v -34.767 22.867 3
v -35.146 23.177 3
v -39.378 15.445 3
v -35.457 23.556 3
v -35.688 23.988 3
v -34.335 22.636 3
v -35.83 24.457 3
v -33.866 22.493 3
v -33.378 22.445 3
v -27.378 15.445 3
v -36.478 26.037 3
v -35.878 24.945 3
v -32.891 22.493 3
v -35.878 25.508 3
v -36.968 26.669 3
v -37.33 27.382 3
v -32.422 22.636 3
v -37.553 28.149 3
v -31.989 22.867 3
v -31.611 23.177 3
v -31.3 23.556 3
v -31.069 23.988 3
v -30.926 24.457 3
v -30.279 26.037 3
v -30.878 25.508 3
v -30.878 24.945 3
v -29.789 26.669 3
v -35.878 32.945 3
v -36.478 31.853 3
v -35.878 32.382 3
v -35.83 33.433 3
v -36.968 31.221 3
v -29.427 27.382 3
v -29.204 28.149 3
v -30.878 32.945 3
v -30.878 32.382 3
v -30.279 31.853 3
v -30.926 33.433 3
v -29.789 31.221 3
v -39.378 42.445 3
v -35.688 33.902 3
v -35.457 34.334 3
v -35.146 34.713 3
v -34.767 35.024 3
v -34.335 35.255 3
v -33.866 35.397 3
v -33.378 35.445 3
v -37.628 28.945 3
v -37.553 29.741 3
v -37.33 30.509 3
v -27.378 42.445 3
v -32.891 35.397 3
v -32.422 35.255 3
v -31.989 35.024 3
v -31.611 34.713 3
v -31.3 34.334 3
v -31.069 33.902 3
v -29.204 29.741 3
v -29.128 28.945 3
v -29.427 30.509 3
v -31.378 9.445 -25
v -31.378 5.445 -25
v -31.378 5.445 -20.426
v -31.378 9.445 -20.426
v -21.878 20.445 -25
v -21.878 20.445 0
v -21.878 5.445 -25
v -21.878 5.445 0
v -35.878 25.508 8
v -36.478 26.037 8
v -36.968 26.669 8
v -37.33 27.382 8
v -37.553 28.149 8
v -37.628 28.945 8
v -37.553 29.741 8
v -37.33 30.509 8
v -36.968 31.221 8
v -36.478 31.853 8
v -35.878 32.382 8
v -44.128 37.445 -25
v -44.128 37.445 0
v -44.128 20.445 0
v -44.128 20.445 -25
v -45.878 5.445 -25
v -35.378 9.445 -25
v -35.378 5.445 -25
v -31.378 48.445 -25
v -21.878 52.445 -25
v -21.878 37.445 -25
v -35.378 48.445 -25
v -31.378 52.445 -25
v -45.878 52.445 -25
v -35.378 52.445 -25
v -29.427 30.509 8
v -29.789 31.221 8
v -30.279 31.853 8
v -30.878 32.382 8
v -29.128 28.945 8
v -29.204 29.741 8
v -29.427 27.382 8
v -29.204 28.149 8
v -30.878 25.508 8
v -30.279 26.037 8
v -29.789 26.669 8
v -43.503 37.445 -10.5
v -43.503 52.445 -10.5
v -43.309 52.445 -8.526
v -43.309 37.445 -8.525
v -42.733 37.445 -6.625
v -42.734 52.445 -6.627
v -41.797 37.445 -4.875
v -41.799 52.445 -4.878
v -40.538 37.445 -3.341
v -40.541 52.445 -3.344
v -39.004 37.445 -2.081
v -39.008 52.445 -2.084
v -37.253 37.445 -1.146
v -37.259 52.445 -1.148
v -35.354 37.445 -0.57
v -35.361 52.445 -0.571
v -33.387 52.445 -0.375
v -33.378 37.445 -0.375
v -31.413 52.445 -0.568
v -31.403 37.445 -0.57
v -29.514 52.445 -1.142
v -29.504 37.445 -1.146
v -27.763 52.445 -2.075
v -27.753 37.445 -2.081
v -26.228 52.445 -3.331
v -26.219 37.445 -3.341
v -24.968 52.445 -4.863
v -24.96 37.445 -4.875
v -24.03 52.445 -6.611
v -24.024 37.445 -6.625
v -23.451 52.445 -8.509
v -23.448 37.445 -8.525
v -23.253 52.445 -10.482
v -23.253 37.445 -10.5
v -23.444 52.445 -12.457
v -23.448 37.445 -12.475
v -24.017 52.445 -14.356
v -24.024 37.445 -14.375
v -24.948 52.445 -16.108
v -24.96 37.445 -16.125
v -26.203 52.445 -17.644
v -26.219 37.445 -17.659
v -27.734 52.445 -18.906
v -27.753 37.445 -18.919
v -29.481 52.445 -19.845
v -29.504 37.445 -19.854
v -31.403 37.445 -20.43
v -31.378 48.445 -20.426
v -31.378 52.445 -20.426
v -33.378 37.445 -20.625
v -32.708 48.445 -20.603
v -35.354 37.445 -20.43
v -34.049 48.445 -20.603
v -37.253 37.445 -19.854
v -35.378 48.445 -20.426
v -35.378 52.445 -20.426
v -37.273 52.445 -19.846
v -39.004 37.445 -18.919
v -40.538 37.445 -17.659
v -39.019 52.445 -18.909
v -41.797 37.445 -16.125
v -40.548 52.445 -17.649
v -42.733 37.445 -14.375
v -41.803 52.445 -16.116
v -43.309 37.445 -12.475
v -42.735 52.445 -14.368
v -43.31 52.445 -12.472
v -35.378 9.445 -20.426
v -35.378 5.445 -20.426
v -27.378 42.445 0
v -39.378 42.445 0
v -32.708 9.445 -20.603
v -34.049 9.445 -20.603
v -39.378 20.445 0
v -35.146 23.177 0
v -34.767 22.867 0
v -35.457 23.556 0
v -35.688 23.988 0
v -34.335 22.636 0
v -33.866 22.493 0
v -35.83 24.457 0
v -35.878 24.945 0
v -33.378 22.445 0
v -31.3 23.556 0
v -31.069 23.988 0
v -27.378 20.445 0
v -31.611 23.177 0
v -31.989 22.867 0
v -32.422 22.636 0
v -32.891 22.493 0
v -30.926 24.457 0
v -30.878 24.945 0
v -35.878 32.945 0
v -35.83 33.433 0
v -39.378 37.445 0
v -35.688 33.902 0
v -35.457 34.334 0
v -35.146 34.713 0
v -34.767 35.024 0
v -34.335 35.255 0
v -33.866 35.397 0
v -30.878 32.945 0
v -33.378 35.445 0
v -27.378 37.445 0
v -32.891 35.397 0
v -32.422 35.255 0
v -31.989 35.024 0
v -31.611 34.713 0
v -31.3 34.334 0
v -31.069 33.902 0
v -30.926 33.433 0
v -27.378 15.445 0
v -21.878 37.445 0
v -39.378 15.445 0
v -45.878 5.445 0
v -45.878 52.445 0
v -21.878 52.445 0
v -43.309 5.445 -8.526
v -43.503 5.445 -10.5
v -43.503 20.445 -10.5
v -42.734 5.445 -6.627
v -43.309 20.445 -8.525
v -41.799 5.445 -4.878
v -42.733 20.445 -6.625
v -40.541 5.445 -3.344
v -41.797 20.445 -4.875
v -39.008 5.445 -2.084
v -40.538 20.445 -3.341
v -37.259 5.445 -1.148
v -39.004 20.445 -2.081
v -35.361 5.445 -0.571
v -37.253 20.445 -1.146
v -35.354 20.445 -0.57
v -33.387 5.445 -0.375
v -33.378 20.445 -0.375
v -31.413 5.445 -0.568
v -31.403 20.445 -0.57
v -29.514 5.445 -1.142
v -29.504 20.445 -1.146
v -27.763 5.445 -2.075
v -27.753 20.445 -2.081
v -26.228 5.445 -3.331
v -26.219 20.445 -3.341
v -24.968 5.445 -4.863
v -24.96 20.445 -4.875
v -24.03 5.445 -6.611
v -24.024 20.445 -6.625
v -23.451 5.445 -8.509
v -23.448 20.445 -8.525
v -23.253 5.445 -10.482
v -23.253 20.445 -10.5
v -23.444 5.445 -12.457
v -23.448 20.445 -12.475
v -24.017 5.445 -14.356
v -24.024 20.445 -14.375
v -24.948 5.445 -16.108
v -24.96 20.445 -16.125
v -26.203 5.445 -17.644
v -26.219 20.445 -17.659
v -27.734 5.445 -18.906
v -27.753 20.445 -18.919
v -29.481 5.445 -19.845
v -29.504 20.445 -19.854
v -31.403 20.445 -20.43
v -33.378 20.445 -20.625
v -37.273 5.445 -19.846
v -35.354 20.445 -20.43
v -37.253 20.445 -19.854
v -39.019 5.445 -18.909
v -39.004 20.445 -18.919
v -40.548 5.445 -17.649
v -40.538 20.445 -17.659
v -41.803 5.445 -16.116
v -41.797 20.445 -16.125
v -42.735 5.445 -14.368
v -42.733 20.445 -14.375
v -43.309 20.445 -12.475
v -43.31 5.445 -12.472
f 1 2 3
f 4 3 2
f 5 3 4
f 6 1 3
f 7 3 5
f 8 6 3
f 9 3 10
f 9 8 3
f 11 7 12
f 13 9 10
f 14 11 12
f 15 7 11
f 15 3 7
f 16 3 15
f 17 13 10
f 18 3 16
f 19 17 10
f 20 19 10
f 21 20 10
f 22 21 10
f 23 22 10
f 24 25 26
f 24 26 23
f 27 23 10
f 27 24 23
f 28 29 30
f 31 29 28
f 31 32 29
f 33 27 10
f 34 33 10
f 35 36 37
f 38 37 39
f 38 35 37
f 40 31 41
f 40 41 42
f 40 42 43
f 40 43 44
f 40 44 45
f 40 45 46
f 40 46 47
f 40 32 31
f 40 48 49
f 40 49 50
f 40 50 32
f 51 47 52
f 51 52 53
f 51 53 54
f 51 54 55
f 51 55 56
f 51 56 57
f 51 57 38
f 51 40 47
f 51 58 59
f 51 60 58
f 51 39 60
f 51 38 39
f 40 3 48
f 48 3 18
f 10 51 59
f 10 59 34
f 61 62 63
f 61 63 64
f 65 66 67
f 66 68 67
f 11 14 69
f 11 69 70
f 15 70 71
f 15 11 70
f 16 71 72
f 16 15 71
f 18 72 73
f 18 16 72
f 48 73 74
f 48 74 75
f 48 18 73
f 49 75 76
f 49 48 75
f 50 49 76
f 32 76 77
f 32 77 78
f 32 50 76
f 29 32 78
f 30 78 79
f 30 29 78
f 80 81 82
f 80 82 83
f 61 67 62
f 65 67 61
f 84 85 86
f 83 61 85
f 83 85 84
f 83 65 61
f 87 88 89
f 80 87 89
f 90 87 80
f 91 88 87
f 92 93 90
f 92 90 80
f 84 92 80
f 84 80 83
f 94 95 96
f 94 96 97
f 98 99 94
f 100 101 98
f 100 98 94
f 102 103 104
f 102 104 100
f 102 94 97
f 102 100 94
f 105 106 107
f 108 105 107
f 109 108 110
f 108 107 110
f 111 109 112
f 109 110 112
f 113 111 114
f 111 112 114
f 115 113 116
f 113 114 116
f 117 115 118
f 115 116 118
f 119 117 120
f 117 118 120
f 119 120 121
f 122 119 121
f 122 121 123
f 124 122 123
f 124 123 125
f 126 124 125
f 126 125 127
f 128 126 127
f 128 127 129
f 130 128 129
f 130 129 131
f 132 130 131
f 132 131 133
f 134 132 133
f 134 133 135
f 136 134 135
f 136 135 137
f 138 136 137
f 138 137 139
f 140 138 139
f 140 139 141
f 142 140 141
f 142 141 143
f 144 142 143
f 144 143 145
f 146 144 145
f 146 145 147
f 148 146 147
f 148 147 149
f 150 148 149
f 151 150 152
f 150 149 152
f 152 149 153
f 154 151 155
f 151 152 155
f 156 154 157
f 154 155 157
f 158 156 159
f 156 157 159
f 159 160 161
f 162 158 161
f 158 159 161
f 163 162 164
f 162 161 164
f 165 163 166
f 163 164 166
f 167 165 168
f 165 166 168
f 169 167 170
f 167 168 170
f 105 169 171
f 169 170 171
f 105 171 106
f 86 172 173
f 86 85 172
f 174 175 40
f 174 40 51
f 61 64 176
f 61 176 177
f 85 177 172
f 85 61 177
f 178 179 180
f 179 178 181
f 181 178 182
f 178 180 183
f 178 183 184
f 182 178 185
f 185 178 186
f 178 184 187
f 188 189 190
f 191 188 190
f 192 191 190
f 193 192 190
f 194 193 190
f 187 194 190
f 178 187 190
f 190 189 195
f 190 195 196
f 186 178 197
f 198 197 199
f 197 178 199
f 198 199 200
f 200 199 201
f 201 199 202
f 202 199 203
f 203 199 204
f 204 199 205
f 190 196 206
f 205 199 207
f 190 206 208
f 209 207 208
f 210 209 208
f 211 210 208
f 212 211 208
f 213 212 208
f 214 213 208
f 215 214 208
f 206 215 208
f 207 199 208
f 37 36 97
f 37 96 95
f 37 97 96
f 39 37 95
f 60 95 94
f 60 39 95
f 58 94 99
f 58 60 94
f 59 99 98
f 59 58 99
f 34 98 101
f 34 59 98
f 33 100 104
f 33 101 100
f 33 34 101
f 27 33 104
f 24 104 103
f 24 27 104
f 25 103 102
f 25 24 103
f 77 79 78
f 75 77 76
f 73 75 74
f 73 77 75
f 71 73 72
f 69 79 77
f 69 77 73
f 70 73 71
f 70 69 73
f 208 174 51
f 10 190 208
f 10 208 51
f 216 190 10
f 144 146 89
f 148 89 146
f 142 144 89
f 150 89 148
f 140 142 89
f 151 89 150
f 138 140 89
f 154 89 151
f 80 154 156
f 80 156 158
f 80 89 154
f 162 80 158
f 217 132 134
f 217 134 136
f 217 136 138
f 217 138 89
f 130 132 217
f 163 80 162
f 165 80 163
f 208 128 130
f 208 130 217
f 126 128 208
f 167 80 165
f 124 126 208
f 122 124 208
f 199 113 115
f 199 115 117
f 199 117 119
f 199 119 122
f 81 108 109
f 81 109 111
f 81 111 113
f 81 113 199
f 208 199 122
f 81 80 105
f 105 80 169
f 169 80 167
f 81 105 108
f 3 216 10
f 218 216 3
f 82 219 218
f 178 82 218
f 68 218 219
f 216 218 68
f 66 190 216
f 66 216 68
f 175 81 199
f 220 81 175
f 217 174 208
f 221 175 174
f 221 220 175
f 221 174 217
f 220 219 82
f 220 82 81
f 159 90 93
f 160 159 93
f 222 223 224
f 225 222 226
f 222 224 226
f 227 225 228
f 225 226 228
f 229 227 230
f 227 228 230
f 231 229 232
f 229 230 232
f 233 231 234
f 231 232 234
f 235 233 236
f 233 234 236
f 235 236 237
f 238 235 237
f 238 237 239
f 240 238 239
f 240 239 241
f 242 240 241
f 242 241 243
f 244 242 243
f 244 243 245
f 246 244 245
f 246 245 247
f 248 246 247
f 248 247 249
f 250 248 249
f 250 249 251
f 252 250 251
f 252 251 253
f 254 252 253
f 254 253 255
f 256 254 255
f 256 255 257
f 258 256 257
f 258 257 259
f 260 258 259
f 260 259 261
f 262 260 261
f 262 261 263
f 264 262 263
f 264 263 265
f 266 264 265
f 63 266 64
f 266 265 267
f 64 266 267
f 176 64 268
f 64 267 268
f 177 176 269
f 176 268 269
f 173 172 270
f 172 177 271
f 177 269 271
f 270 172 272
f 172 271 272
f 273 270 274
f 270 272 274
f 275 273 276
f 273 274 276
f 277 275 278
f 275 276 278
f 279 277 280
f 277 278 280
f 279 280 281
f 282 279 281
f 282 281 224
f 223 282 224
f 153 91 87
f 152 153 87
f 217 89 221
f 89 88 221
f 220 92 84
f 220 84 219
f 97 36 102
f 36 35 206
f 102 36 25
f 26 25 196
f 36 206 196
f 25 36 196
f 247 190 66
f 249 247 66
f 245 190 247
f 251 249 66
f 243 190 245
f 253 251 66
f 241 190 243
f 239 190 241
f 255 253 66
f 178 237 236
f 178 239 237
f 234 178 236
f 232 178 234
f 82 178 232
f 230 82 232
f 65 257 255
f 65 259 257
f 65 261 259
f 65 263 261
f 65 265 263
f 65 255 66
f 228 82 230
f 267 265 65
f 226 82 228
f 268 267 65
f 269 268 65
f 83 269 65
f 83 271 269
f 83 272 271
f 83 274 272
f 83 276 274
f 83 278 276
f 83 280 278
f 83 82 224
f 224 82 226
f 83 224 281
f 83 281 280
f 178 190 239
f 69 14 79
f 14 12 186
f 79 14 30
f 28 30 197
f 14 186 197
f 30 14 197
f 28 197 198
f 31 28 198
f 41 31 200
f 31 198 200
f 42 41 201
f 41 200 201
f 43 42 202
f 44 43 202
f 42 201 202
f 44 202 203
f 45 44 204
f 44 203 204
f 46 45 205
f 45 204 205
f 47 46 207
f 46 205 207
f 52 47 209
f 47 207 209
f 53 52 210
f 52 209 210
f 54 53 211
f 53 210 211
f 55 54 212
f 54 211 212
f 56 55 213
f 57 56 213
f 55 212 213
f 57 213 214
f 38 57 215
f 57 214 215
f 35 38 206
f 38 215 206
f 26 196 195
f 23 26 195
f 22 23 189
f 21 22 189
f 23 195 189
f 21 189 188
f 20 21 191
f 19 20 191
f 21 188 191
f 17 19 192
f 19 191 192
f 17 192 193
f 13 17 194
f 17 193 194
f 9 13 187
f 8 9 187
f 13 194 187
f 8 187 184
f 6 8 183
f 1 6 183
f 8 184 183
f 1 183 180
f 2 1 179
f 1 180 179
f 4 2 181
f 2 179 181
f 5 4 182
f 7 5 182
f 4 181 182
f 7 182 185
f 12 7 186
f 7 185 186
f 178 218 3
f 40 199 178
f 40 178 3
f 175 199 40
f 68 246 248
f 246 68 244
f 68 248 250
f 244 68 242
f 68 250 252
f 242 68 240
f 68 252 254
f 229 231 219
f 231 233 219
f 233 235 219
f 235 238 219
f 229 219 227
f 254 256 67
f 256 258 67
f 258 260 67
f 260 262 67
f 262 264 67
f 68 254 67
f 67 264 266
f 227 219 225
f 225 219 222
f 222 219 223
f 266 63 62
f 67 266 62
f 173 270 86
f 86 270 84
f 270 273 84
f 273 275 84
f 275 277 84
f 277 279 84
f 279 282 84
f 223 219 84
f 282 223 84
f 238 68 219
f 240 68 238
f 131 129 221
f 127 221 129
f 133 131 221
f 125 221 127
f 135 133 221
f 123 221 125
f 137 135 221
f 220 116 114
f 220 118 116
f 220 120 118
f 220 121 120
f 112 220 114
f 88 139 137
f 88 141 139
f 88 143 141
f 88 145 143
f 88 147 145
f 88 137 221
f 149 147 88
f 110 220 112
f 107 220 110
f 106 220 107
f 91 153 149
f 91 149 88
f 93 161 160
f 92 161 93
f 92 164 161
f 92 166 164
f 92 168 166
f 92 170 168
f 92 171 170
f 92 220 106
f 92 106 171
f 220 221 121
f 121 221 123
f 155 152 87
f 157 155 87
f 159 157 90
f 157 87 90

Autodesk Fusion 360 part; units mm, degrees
sketch "Sketch1" plane through (0, 0, 0) normal (0, 0, 1) x (1, 0, 0)
  line L0 (-39.3784, 42.4452) -> (-27.3784, 42.4452)
  line L1 (-27.3784, 42.4452) -> (-27.3784, 15.4452)
  line L2 (-27.3784, 15.4452) -> (-39.3784, 15.4452)
  line L3 (-39.3784, 15.4452) -> (-39.3784, 42.4452)
  dimension "d1" = 12
  dimension "d2" = 27
extrude "Extrude1" add sketch "Sketch1" along normal blind 3
sketch "Sketch2" plane through (0, 0, 3) normal (0, 0, 1) x (-1, 0, 0)
  line L0 (39.3784, -15.4452) -> (27.3784, -15.4452)
  line L1 (27.3784, -15.4452) -> (27.3784, -42.4452)
  line L2 (27.3784, -42.4452) -> (39.3784, -42.4452)
  line L3 (39.3784, -42.4452) -> (39.3784, -15.4452)
  circle A0 centre (33.3784, -28.9452) radius 4.25
  dimension "d5" = 8.5
extrude "Extrude2" add sketch "Sketch2" along normal blind 4.5 contours A0
sketch "Sketch3" plane through (0, 0, 0) normal (0, 0, -1) x (1, 0, 0)
  line L0 (-27.3784, -15.4452) -> (-39.3784, -15.4452)
  line L1 (-39.3784, -15.4452) -> (-39.3784, -42.4452)
  line L2 (-39.3784, -42.4452) -> (-27.3784, -42.4452)
  line L3 (-27.3784, -42.4452) -> (-27.3784, -15.4452)
  line L4 (-33.3784, -15.4452) -> (-30.8784, -15.4452) construction
  line L5 (-30.8784, -15.4452) -> (-35.8784, -15.4452)
  line L6 (-35.8784, -15.4452) -> (-35.8784, -42.4452)
  line L7 (-35.8784, -42.4452) -> (-30.8784, -42.4452)
  line L8 (-30.8784, -42.4452) -> (-30.8784, -15.4452)
  line L9 (-30.8784, -28.9452) -> (-30.8784, -24.9452) construction
  line L10 (-30.8784, -24.9452) -> (-35.8784, -24.9452)
  line L11 (-35.8784, -24.9452) -> (-35.8784, -32.9452)
  line L12 (-35.8784, -32.9452) -> (-30.8784, -32.9452)
  line L13 (-30.8784, -32.9452) -> (-30.8784, -24.9452)
  circle A0 centre (-33.3784, -32.9452) radius 2.5
  circle A1 centre (-33.3784, -24.9452) radius 2.5
  dimension "d8" = 2.5
  dimension "d9" = 5
  dimension "d10" = 4
  dimension "d11" = 8
extrude "Extrude3" cut sketch "Sketch3" against normal blind 15 contours L10 A1 | L10 A1 | L6 L8 L11 L13 A0 A1 | L12 A0 | L12 A0
sketch "Sketch4" plane through (-35.8784, 0, 0) normal (1, 0, 0) x (0, 1, 0)
  line L0 (25.5083, 3) -> (24.9452, 3)
  line L1 (24.9452, 3) -> (24.9452, 0)
  line L2 (24.9452, 0) -> (32.9452, 0)
  line L3 (32.9452, 0) -> (32.9452, 3)
  line L4 (32.9452, 3) -> (32.3821, 3)
  line L5 (32.3821, 3) -> (32.3821, 7.5)
  line L6 (32.3821, 7.5) -> (25.5083, 7.5)
  line L7 (25.5083, 7.5) -> (25.5083, 3)
sketch "Sketch5" plane through (0, 0, 0) normal (0, 0, -1) x (1, 0, 0)
  line L0 (-35.8784, -32.9452) -> (-35.8784, -24.9452)
  arc A0 (-30.8784, -24.9452) -> (-35.8784, -24.9452) centre (-33.3784, -24.9452) ccw
  line L1 (-30.8784, -24.9452) -> (-30.8784, -32.9452)
  arc A1 (-35.8784, -32.9452) -> (-30.8784, -32.9452) centre (-33.3784, -32.9452) ccw
  line L2 (-27.3784, -15.4452) -> (-39.3784, -15.4452)
  line L3 (-39.3784, -15.4452) -> (-39.3784, -42.4452)
  line L4 (-39.3784, -42.4452) -> (-27.3784, -42.4452)
  line L5 (-27.3784, -42.4452) -> (-27.3784, -15.4452)
  line L6 (-39.3784, -42.4452) -> (-27.3784, -42.4452)
  line L7 (-27.3784, -42.4452) -> (-27.3784, -38.4452)
  line L8 (-27.3784, -38.4452) -> (-39.3784, -38.4452)
  line L9 (-39.3784, -38.4452) -> (-39.3784, -42.4452)
  line L10 (-39.3784, -15.4452) -> (-27.3784, -15.4452)
  line L11 (-27.3784, -15.4452) -> (-27.3784, -19.4452)
  line L12 (-27.3784, -19.4452) -> (-39.3784, -19.4452)
  line L13 (-39.3784, -19.4452) -> (-39.3784, -15.4452)
  dimension "d14" = 4
  dimension "d15" = 4
extrude "Extrude4" add sketch "Sketch5" along normal blind 25 contours L2 L3 L5 L10 L11 L12 L13 | L3 L4 L5 L6 L7 L8 L9
sketch "Sketch6" plane through (-27.3784, 0, 0) normal (1, 0, 0) x (0, 1, 0)
  line L0 (42.4452, -25) -> (42.4452, 3)
  line L1 (42.4452, 3) -> (15.4452, 3)
  line L2 (15.4452, 3) -> (15.4452, -25)
  line L3 (15.4452, -25) -> (19.4452, -25)
  line L4 (19.4452, -25) -> (19.4452, 0)
  line L5 (19.4452, 0) -> (38.4452, 0)
  line L6 (38.4452, 0) -> (38.4452, -25)
  line L7 (38.4452, -25) -> (42.4452, -25)
  line L8 (19.4452, 0) -> (15.4452, 0)
  line L9 (38.4452, 0) -> (42.4452, 0)
extrude "Extrude5" add sketch "Sketch6" along normal blind 4 contours L0 L6 L7 L9 | L2 L3 L4 L8
sketch "Sketch7" plane through (-39.3784, 0, 0) normal (-1, 0, 0) x (0, -1, 0)
  line L0 (-15.4452, -25) -> (-15.4452, 3)
  line L1 (-15.4452, 3) -> (-42.4452, 3)
  line L2 (-42.4452, 3) -> (-42.4452, -25)
  line L3 (-42.4452, -25) -> (-38.4452, -25)
  line L4 (-38.4452, -25) -> (-38.4452, 0)
  line L5 (-38.4452, 0) -> (-19.4452, 0)
  line L6 (-19.4452, 0) -> (-19.4452, -25)
  line L7 (-19.4452, -25) -> (-15.4452, -25)
  line L8 (-42.4452, 0) -> (-15.4452, 0)
extrude "Extrude6" add sketch "Sketch7" along normal blind 4 contours L0 L6 L7 L8 | L2 L3 L4 L8
sketch "Sketch8" plane through (0, 15.4452, 0) normal (0, -1, 0) x (1, 0, 0)
  line L0 (-27.3784, 0) -> (-27.3784, 3)
  line L1 (-27.3784, 3) -> (-39.3784, 3)
  line L2 (-39.3784, 3) -> (-39.3784, 0)
  line L3 (-39.3784, 0) -> (-43.3784, 0)
  line L4 (-43.3784, 0) -> (-43.3784, -25)
  line L5 (-43.3784, -25) -> (-23.3784, -25)
  line L6 (-23.3784, -25) -> (-23.3784, 0)
  line L7 (-23.3784, 0) -> (-27.3784, 0)
  line L8 (-39.3784, 0) -> (-27.3784, 0)
extrude "Extrude7" add sketch "Sketch8" along normal blind 11 contours L3 L4 L5 L6 L7 L8
sketch "Sketch9" plane through (0, 42.4452, 0) normal (0, 1, 0) x (-1, 0, 0)
  line L0 (39.3784, 0) -> (39.3784, 3)
  line L1 (39.3784, 3) -> (27.3784, 3)
  line L2 (27.3784, 3) -> (27.3784, 0)
  line L3 (27.3784, 0) -> (23.3784, 0)
  line L4 (23.3784, 0) -> (23.3784, -25)
  line L5 (23.3784, -25) -> (43.3784, -25)
  line L6 (43.3784, -25) -> (43.3784, 0)
  line L7 (43.3784, 0) -> (39.3784, 0)
  line L8 (27.3784, 0) -> (39.3784, 0)
extrude "Extrude8" add sketch "Sketch9" along normal blind 11 contours L3 L4 L5 L6 L7 L8
sketch "Sketch10" plane through (0, 53.4452, 0) normal (0, 1, 0) x (-1, 0, 0)
  line L0 (23.3784, 0) -> (23.3784, -25)
  line L1 (23.3784, -25) -> (43.3784, -25)
  line L2 (43.3784, -25) -> (43.3784, 0)
  line L3 (43.3784, 0) -> (23.3784, 0)
  line L4 (33.3784, 0) -> (33.3784, -10.5) construction
  circle A0 centre (33.3784, -10.5) radius 10
  dimension "d26" = 10.5
  dimension "d27" = 20
extrude "Extrude9" cut sketch "Sketch10" against normal blind 62 contours A0
extrude "Extrude10" add 4 faces at (-23.3784, 48.4452, -3.5) (-23.3784, 9.4452, -7) (-23.3784, 14.4452, -20.1667) (-23.3784, 48.4452, -20.1667) along direction (1, 0, 0) blind 0.5
extrude "Extrude11" add 4 faces at (-43.3784, 43.4452, -3.5) (-43.3784, 48.4452, -20.1667) (-43.3784, 14.4452, -15.3333) (-43.3784, 14.4452, -3.5) along direction (-1, 0, 0) blind 0.5
extrude "Extrude12" add 1 faces at (-33.1293, 38.4452, -23.4907) along direction (0, -1, 0) blind 1
extrude "Extrude13" add 1 faces at (-33.1293, 19.4452, -23.4907) along direction (0, 1, 0) blind 1
extrude "Extrude14" add 1 faces at (-43.8784, 42.7785, -8.3333) along direction (-1, 0, 0) blind 2
extrude "Extrude15" add 1 faces at (-43.8784, 15.1119, -8.3333) along direction (-1, 0, 0) blind 2
extrude "Extrude16" add 1 faces at (-22.8784, 42.7785, -16.6667) along direction (1, 0, 0) blind 2
extrude "Extrude17" add 1 faces at (-22.8784, 15.1119, -8.3333) along direction (1, 0, 0) blind 2
extrude "Extrude18" cut 1 faces at (-33.1293, 4.4452, -23.4907) along direction (0, 1, 0) blind 1
extrude "Extrude19" cut 1 faces at (-33.1293, 53.4452, -23.4907) along direction (0, -1, 0) blind 1
extrude "Extrude20" add 2 faces at (-30.1717, 28.772, 7.5) (-36.576, 27.9712, 7.5) along direction (0, 0, 1) blind 0.5
sketch "Sketch11" plane through (0, 52.4452, 0) normal (0, 1, 0) x (-1, 0, 0)
  line L0 (45.8784, 0) -> (20.8784, 0)
  line L1 (20.8784, 0) -> (20.8784, -25)
  line L2 (20.8784, -25) -> (45.8784, -25)
  line L3 (45.8784, -25) -> (45.8784, 0)
  circle A0 centre (33.3784, -10.5) radius 10
  line L4 (45.8784, 0) -> (44.1284, 0)
  line L5 (44.1284, 0) -> (44.1284, -25)
  line L6 (44.1284, -25) -> (45.8784, -25)
  line L7 (45.8784, -25) -> (45.8784, 0)
  dimension "d52" = 1.75
extrude "Extrude21" add sketch "Sketch11" against normal blind 47 contours L0 L2 L3 L4 L5 L6 L7
extrude "Extrude22" cut 2 faces at (-20.8784, 47.4452, -16.6667) (-20.8784, 10.4452, -8.3333) along direction (-1, 0, 0) blind 1
sketch "Sketch12" plane through (0, 52.4452, 0) normal (0, 1, 0) x (-1, 0, 0)
  line L0 (21.8784, 0) -> (21.8784, -25)
  line L1 (21.8784, -25) -> (45.8784, -25)
  line L2 (45.8784, -25) -> (45.8784, 0)
  line L3 (45.8784, 0) -> (21.8784, 0)
  circle A0 centre (33.3784, -10.5) radius 10
  circle A1 centre (33.3784, -10.5) radius 10.125
  dimension "d67" = 20.25
extrude "Extrude25" cut sketch "Sketch12" against normal blind 68 contours A1
sketch "Sketch13" plane through (0, 0, -25) normal (0, 0, -1) x (1, 0, 0)
  line L0 (-21.8784, -52.4452) -> (-21.8784, -37.4452)
  line L1 (-21.8784, -37.4452) -> (-44.1284, -37.4452)
  line L2 (-44.1284, -37.4452) -> (-44.1284, -20.4452)
  line L3 (-44.1284, -20.4452) -> (-21.8784, -20.4452)
  line L4 (-21.8784, -20.4452) -> (-21.8784, -5.4452)
  line L5 (-21.8784, -5.4452) -> (-45.8784, -5.4452)
  line L6 (-45.8784, -5.4452) -> (-45.8784, -52.4452)
  line L7 (-45.8784, -52.4452) -> (-21.8784, -52.4452)
  line L8 (-45.8784, -52.4452) -> (-33.3784, -52.4452) construction
  line L9 (-33.3784, -52.4452) -> (-35.3784, -52.4452) construction
  line L10 (-35.3784, -52.4452) -> (-31.3784, -52.4452)
  line L11 (-31.3784, -52.4452) -> (-31.3784, -48.4452)
  line L12 (-31.3784, -48.4452) -> (-35.3784, -48.4452)
  line L13 (-35.3784, -48.4452) -> (-35.3784, -52.4452)
  dimension "d57" = 12.5
  dimension "d58" = 2
  dimension "d59" = 4
  dimension "d60" = 4
extrude "Extrude23" cut sketch "Sketch13" against normal blind 10 contours L7 L10 L11 L12 L13
sketch "Sketch14" plane through (0, 0, -25) normal (0, 0, -1) x (1, 0, 0)
  line L0 (-35.3784, -52.4452) -> (-35.3784, -48.4452)
  line L1 (-35.3784, -48.4452) -> (-31.3784, -48.4452)
  line L2 (-31.3784, -48.4452) -> (-31.3784, -52.4452)
  line L3 (-31.3784, -52.4452) -> (-21.8784, -52.4452)
  line L4 (-21.8784, -52.4452) -> (-21.8784, -37.4452)
  line L5 (-21.8784, -37.4452) -> (-44.1284, -37.4452)
  line L6 (-44.1284, -37.4452) -> (-44.1284, -20.4452)
  line L7 (-44.1284, -20.4452) -> (-21.8784, -20.4452)
  line L8 (-21.8784, -20.4452) -> (-21.8784, -5.4452)
  line L9 (-21.8784, -5.4452) -> (-45.8784, -5.4452)
  line L10 (-45.8784, -5.4452) -> (-45.8784, -52.4452)
  line L11 (-45.8784, -52.4452) -> (-35.3784, -52.4452)
  line L12 (-35.3784, -48.4452) -> (-35.3784, -5.4452) construction
  line L13 (-35.3784, -5.4452) -> (-31.3784, -5.4452)
  line L14 (-31.3784, -5.4452) -> (-31.3784, -9.4452)
  line L15 (-31.3784, -9.4452) -> (-35.3784, -9.4452)
  line L16 (-35.3784, -9.4452) -> (-35.3784, -5.4452)
  dimension "d63" = 4
  dimension "d64" = 4
extrude "Extrude24" cut sketch "Sketch14" against normal blind 7 contours L9 L13 L14 L15 L16
